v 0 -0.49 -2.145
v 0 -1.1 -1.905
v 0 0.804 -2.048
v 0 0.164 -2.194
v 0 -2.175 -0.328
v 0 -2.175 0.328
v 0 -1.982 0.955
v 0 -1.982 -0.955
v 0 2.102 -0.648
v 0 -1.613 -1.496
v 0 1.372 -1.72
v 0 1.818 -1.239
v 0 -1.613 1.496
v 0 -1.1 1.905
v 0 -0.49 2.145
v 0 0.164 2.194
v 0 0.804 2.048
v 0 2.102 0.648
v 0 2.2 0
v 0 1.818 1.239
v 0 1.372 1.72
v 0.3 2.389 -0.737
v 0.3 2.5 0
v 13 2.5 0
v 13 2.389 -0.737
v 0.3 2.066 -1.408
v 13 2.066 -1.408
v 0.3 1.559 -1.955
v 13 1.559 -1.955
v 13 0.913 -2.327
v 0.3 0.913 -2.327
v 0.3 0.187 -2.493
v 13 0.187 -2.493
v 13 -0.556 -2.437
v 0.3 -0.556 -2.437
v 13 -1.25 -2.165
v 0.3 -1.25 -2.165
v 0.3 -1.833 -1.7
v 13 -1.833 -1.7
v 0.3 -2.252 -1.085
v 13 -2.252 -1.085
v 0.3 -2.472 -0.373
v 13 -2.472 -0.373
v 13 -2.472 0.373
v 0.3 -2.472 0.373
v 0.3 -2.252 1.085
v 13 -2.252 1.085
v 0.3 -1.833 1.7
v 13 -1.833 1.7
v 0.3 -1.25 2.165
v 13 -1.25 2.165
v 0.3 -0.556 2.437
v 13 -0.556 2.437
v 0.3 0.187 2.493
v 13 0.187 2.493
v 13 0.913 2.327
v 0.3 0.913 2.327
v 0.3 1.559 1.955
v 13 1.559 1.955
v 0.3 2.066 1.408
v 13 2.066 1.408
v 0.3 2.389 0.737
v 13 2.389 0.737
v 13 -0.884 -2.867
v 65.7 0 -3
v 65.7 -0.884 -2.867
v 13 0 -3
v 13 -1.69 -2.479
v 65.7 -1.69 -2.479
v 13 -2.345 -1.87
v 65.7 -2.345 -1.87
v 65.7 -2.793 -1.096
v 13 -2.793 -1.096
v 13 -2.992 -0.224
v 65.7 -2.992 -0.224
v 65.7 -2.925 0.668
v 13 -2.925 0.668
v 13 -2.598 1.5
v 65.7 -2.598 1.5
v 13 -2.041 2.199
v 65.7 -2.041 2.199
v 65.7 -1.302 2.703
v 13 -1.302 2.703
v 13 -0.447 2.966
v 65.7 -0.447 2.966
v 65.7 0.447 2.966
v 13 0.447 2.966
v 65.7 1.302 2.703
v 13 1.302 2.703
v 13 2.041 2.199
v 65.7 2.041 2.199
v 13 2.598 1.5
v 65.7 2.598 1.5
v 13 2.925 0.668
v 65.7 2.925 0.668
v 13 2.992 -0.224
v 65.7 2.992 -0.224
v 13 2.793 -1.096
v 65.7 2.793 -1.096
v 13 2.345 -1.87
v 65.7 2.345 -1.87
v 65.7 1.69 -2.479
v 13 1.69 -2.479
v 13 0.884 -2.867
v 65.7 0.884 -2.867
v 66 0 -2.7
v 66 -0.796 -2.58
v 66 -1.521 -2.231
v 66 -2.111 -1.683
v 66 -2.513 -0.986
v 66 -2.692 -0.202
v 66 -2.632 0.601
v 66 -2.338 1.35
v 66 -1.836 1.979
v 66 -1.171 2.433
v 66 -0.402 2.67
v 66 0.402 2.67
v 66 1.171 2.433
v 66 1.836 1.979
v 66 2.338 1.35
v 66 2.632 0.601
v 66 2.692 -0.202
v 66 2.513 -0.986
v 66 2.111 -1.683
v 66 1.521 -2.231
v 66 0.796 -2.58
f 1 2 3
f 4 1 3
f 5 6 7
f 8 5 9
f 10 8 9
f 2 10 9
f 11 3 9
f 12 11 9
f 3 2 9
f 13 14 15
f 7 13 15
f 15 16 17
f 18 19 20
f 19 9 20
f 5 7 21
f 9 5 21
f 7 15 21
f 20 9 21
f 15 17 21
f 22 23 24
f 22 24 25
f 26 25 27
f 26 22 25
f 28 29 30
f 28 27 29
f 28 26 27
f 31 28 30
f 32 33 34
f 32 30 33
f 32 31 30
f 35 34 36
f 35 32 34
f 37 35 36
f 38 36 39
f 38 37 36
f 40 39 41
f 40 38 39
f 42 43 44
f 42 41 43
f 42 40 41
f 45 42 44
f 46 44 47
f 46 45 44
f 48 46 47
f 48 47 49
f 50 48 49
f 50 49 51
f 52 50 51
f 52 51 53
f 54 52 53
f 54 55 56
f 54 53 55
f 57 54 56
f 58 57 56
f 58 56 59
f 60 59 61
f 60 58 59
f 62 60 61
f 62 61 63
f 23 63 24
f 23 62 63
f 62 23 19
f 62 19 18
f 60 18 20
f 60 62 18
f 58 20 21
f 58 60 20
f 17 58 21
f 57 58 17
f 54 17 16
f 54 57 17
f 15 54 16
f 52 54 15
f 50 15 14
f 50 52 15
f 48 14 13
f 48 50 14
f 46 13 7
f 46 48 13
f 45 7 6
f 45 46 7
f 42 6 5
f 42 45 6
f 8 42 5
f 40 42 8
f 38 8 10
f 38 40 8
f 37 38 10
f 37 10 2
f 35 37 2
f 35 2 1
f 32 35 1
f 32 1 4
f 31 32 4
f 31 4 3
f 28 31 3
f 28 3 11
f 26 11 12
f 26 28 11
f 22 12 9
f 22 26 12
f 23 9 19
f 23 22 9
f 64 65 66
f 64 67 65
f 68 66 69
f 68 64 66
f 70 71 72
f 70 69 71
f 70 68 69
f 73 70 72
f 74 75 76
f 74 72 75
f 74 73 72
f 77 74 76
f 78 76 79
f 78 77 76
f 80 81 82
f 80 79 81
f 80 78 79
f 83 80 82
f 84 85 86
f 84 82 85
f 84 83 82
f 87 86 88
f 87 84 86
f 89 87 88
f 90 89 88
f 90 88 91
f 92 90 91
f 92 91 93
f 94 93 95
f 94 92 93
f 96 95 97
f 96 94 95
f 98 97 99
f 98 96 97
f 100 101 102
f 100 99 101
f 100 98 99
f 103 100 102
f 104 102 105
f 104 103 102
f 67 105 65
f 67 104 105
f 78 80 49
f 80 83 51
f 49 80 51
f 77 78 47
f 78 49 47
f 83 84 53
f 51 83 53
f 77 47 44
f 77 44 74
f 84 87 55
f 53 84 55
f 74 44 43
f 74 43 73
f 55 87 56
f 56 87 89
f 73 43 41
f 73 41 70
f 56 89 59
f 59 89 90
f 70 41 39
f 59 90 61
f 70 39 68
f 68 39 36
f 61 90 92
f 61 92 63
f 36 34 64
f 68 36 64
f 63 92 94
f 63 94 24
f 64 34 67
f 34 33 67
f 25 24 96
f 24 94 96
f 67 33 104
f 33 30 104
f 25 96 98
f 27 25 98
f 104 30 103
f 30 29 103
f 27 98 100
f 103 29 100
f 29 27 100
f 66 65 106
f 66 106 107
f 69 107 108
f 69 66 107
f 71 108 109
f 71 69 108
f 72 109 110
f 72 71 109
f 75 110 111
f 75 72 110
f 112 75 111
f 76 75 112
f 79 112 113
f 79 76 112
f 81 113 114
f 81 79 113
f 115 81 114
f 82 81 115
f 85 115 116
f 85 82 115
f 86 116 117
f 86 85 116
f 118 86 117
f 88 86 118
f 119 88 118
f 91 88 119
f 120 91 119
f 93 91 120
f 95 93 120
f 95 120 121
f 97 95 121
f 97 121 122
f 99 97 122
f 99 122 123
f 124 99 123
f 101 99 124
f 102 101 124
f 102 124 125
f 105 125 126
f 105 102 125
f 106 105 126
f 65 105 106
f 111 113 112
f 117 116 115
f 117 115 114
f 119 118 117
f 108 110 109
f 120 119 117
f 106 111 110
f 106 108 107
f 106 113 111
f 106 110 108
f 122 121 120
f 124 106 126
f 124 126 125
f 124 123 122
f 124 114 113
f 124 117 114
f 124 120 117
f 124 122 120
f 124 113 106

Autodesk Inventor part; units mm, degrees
ref_plane "YZ Plane" through (0, 0, 0) normal (1, 0, 0) x (0, 1, 0)
ref_plane "XZ Plane" through (0, 0, 0) normal (0, 1, 0) x (-1, 0, 0)
ref_plane "XY Plane" through (0, 0, 0) normal (0, 0, 1) x (1, 0, 0)
sketch "Sketch1" plane through (0, 0, 0) normal (1, 0, 0) x (0, 1, 0)
  circle A0 centre (0, 0) radius 2.5
  dimension "d0" = 5
extrude "Extrusion1" add sketch "Sketch1" along normal blind 13
sketch "Sketch2" plane through (13, 0, 0) normal (1, 0, 0) x (0, 0, -1)
  circle A0 centre (0, 0) radius 3
  dimension "d3" = 6
extrude "Extrusion2" add sketch "Sketch2" along normal blind 53
chamfer "Chamfer1" distance 0.3 angle 45 2 edges at (0, -2.5, 0) (66, 0, 3)
thread "Thread1" size "12-24 UNC" class "2A" standard "ANSI Unified Screw Threads" length 8 offset 5
thread "Thread2" size "1/4-20 UNC" class "2A" standard "ANSI Unified Screw Threads" length 8 offset 45
properties part number "Piston Rod" material "Steel"
